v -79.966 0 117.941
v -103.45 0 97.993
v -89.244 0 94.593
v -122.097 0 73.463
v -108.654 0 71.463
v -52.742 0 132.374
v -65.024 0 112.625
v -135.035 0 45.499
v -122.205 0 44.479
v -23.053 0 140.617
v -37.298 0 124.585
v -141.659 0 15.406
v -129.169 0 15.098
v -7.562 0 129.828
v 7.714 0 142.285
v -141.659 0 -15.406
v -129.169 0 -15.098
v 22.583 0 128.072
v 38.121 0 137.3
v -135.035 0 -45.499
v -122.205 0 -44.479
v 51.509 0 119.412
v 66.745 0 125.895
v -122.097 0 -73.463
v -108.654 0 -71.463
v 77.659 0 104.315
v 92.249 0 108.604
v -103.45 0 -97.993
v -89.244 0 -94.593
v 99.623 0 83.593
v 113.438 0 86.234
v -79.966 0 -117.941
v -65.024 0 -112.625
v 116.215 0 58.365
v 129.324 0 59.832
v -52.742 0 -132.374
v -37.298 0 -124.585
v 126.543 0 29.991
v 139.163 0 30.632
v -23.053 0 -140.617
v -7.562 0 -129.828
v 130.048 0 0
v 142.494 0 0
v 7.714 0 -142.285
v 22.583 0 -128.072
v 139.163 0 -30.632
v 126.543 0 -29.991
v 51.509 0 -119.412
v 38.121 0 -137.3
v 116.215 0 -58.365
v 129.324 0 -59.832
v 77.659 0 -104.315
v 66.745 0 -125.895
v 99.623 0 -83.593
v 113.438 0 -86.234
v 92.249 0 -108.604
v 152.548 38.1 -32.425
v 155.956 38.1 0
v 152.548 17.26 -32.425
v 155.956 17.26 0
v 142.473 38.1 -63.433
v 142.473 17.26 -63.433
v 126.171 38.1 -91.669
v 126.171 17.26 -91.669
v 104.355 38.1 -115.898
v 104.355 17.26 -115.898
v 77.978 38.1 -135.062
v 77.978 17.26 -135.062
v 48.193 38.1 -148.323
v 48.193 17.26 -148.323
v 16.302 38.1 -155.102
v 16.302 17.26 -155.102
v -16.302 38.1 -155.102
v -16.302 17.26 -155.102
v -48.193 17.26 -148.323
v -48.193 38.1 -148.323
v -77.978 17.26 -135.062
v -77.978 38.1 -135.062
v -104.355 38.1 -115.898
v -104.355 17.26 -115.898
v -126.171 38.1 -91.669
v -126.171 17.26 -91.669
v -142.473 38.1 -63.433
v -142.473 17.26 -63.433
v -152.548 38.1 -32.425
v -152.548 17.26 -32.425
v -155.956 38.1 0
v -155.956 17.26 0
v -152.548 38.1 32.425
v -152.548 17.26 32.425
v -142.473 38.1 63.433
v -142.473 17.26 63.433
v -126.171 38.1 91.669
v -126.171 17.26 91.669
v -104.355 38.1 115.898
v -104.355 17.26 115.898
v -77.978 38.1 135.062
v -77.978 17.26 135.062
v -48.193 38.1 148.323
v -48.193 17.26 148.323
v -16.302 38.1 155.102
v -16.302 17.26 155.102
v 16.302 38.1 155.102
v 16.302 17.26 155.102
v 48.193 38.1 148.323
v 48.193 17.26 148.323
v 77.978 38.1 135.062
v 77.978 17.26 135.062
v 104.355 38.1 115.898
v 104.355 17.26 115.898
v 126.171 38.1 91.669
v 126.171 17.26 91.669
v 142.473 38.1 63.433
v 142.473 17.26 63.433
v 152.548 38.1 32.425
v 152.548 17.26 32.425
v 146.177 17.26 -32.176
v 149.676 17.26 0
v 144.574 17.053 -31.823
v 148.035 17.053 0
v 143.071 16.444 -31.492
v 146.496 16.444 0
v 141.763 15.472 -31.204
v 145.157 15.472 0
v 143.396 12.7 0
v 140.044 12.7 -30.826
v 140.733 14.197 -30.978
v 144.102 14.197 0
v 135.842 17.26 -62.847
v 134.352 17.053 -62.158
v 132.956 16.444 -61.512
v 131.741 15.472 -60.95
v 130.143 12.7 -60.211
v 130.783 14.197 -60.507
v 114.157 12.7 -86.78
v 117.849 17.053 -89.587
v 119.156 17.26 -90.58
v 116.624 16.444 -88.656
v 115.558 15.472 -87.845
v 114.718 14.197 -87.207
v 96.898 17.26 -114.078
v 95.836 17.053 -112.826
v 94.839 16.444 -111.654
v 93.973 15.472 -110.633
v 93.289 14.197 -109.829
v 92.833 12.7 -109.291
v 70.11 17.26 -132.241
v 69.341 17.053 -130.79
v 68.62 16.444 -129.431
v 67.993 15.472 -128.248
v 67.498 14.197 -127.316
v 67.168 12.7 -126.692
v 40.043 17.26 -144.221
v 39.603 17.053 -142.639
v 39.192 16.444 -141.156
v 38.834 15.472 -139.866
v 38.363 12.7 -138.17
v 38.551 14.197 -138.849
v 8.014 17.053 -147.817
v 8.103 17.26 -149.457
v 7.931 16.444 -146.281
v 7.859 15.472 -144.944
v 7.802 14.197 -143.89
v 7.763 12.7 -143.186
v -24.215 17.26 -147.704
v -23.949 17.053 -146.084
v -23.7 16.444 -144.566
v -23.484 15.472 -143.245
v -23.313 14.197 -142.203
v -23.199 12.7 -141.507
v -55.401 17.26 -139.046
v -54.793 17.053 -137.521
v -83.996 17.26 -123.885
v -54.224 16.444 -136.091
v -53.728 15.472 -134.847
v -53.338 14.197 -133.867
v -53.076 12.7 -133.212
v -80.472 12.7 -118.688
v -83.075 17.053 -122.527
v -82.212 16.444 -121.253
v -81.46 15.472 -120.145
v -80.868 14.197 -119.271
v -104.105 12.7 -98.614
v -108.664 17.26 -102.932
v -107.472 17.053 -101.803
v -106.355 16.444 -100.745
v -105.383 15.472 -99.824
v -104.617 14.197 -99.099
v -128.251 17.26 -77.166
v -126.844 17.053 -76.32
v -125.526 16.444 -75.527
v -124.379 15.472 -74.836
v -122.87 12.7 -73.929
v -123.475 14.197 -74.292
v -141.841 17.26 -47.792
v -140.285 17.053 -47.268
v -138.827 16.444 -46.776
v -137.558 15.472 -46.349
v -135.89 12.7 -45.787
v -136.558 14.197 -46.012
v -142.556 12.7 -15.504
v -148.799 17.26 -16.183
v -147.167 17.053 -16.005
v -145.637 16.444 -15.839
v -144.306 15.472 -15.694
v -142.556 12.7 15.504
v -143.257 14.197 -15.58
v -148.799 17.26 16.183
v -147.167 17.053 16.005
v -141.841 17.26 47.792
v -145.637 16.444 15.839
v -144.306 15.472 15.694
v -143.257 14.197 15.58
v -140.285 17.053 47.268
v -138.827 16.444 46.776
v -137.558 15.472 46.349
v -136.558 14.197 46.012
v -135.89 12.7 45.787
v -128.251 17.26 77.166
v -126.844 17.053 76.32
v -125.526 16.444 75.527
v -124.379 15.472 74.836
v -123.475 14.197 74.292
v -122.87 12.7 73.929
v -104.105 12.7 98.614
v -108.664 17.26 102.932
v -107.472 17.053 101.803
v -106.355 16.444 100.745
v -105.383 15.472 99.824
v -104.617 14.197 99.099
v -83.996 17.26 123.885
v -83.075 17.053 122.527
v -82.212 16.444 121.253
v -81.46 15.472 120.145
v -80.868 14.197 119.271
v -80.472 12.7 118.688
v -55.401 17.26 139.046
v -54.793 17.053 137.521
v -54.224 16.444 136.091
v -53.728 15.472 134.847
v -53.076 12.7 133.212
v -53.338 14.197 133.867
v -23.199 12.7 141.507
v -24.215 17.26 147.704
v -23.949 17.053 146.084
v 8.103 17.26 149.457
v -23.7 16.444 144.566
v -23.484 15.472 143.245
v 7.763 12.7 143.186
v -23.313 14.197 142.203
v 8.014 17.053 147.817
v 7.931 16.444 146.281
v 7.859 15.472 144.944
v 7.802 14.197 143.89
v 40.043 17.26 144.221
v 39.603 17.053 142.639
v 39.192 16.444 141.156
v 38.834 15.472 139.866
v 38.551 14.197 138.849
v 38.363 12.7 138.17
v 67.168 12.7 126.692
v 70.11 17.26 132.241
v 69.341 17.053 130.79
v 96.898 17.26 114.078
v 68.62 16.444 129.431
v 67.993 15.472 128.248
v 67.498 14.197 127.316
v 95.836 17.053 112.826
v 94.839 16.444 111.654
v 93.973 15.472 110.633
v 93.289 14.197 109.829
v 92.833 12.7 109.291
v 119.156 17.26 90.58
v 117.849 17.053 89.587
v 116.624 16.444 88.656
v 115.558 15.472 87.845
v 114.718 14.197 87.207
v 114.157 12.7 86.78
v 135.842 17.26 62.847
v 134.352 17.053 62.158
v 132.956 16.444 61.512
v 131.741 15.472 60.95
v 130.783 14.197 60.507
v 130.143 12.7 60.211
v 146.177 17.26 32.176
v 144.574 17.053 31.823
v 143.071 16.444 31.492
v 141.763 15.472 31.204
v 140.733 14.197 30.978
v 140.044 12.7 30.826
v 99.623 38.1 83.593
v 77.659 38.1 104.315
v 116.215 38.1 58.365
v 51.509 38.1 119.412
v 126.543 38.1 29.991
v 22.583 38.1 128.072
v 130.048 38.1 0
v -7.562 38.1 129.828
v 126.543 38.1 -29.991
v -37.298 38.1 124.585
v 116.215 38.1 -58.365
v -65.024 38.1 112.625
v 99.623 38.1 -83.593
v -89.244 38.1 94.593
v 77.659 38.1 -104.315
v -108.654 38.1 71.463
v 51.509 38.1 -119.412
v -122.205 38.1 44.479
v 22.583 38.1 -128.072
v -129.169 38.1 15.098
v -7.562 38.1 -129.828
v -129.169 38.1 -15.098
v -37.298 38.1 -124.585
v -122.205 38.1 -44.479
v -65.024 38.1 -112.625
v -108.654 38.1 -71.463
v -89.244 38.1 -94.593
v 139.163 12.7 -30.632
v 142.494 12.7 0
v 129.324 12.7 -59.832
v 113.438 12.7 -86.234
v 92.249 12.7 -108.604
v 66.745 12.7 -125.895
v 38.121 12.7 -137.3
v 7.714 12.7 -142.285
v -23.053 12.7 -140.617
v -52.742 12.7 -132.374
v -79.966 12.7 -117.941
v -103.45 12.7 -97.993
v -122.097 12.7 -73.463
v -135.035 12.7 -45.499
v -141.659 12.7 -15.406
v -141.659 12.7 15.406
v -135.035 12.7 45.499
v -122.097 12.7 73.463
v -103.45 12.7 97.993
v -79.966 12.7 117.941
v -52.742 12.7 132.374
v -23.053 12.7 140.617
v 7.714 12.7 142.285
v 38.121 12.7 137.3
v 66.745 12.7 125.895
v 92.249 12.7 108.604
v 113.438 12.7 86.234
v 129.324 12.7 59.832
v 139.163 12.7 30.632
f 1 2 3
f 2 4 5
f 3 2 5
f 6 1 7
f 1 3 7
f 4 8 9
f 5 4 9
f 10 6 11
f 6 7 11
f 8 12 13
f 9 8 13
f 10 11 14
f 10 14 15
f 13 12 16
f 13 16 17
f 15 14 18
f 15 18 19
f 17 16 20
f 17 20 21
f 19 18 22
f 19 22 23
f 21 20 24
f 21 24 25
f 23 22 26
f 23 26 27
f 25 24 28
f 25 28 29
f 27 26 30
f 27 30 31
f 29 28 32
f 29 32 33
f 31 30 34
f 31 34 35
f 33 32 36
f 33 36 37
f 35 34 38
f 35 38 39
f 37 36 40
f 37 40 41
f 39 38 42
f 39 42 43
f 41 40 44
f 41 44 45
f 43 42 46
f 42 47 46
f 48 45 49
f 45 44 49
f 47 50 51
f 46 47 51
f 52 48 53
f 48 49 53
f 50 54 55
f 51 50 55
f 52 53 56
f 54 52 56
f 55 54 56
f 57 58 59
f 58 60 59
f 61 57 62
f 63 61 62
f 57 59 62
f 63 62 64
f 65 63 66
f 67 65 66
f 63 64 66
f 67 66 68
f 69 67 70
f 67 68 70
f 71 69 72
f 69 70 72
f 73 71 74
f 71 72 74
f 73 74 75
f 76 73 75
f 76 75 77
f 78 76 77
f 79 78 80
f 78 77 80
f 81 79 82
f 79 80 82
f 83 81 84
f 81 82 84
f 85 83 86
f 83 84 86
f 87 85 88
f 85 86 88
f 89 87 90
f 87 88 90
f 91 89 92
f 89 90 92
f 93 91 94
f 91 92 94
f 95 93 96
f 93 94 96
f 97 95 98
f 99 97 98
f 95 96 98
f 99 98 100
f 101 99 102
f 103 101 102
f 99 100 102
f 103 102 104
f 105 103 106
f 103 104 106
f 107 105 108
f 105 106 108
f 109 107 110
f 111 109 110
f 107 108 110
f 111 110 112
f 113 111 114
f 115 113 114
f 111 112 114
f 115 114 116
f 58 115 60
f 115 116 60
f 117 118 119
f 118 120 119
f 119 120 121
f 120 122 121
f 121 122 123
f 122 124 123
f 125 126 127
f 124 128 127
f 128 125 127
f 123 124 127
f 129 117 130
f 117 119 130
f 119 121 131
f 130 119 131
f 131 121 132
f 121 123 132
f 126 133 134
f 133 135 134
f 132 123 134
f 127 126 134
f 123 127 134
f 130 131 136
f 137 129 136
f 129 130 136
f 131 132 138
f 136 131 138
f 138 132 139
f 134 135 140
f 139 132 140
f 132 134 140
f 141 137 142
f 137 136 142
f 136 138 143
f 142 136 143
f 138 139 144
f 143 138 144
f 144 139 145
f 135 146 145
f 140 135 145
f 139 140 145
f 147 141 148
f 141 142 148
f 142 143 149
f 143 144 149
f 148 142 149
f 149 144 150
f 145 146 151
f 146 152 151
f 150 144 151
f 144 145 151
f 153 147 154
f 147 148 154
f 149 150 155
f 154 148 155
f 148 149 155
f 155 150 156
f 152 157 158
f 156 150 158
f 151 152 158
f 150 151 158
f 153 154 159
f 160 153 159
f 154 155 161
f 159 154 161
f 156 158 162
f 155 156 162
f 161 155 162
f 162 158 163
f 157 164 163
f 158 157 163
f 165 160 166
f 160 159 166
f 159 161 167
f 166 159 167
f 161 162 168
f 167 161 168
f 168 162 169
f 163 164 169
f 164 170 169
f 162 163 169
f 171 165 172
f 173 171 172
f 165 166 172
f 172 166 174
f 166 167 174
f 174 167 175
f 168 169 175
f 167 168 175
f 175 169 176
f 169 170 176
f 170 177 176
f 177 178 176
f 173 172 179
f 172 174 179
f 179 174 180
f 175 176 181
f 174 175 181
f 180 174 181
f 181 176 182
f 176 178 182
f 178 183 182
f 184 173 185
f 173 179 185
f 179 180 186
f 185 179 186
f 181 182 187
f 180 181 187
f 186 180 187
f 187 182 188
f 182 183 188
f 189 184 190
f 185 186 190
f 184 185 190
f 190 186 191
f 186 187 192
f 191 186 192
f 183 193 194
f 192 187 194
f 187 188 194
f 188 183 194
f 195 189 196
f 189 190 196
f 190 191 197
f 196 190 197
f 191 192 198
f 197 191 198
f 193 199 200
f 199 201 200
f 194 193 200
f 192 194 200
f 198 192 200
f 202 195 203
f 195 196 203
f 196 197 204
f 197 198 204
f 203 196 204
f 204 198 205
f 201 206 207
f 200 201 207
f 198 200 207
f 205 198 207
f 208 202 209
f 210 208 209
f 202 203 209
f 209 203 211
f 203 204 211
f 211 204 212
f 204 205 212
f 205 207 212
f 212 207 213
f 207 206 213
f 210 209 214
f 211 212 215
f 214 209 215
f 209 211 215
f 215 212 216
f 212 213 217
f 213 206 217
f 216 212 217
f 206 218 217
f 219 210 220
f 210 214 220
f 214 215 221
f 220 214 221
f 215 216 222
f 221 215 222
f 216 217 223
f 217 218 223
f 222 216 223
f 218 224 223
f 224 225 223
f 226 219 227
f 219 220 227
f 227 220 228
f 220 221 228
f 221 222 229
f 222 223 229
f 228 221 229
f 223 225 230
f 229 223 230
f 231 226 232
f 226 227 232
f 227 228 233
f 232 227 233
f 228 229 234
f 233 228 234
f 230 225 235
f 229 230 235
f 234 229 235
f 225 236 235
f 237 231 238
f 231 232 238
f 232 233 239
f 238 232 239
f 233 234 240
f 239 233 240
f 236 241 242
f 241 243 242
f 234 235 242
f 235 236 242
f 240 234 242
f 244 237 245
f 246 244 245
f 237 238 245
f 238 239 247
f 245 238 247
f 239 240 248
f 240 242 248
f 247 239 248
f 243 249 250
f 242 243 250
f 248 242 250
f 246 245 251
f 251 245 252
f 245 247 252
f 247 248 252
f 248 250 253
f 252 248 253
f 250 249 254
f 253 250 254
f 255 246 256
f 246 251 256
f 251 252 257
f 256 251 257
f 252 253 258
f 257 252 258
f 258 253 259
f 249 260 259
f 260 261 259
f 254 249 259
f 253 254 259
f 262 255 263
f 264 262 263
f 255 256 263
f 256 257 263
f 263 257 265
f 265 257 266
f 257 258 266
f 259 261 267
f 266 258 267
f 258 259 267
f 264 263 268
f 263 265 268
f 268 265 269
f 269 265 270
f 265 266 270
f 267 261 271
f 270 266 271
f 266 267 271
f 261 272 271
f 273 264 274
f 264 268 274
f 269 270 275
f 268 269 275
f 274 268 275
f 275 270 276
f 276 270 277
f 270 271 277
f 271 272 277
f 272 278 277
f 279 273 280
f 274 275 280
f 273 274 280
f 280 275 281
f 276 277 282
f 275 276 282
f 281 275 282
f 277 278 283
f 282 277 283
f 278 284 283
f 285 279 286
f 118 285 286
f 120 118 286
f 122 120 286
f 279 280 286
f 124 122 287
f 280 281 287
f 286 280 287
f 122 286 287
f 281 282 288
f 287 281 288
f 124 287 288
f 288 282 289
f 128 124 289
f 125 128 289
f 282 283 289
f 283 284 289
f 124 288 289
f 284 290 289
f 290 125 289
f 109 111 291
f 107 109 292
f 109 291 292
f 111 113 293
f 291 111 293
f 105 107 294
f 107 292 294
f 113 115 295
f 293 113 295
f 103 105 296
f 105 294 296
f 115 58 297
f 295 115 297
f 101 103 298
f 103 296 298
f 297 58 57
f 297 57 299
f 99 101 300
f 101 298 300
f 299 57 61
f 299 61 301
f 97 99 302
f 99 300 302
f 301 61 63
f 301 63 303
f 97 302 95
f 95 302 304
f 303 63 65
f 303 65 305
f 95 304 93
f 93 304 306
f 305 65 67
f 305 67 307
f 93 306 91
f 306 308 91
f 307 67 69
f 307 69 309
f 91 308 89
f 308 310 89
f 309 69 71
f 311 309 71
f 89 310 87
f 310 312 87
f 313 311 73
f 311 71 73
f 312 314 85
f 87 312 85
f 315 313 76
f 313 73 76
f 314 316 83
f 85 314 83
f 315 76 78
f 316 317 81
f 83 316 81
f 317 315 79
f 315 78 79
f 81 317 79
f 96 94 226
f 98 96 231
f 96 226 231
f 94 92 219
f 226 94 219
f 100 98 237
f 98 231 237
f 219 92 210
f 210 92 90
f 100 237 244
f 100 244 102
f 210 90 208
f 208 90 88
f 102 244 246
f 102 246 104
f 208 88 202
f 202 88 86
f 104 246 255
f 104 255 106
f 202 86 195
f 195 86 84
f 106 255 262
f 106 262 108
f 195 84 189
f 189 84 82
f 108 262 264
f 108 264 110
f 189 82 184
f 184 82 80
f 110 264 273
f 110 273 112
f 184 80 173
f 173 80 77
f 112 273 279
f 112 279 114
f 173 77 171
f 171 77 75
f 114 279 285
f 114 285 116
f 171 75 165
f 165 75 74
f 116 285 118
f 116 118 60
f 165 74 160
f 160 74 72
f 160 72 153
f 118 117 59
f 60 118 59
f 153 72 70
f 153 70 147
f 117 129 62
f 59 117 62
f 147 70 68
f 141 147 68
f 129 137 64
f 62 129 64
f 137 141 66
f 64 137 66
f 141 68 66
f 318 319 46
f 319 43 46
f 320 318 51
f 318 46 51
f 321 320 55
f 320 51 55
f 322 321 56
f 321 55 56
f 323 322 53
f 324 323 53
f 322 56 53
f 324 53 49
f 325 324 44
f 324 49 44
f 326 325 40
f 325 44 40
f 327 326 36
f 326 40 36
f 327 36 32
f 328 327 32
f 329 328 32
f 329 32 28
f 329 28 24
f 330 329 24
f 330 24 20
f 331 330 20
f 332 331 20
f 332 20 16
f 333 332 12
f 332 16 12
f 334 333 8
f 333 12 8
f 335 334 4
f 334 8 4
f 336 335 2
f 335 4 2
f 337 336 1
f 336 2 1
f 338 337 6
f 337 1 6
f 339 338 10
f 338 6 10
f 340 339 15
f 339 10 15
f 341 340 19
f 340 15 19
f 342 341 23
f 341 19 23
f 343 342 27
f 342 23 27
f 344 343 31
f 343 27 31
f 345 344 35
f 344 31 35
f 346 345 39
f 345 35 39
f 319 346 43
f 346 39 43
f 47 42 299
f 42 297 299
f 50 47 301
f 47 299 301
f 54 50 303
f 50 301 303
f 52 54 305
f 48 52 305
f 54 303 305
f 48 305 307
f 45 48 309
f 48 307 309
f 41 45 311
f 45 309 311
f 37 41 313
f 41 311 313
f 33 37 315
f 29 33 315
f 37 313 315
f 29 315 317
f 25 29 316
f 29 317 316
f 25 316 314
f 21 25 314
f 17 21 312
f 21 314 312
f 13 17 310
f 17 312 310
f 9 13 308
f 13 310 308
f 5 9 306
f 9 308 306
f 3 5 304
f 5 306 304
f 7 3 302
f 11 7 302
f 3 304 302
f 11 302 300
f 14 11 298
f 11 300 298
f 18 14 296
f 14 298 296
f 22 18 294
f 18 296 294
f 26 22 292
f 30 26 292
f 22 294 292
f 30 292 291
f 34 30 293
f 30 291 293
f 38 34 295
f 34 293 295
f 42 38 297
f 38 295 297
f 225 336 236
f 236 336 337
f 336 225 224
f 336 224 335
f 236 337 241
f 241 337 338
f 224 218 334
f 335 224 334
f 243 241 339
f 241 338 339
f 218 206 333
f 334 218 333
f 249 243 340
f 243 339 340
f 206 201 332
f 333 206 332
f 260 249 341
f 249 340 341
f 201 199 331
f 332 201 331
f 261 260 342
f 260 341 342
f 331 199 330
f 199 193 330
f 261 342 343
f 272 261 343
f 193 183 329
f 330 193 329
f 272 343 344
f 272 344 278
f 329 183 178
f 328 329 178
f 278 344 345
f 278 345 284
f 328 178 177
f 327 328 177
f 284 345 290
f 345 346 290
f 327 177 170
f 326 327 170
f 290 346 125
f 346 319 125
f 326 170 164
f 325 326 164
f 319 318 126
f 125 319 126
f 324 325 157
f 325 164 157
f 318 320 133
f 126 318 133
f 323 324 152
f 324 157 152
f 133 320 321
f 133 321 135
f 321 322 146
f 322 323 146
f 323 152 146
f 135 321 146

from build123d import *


with BuildPart() as part:
    # Esquisse1 → Révolution1 (revolve)
    with BuildSketch(Plane.XY):
        with BuildLine():
            Line((143.396454905, 12.7), (142.494, 12.7))
            Line((142.494, 12.7), (142.494, 0))
            Line((142.494, 0), (130.048, 0))
            Line((130.048, 0), (130.048, 38.1))
            Line((130.048, 38.1), (155.956, 38.1))
            Line((155.956, 38.1), (155.956, 17.260162249))
            Line((155.956, 17.260162249), (149.676227452, 17.260162249))
            ThreePointArc((149.676227452, 17.260162249), (145.79580792, 15.999865109), (143.396454905, 12.7))
        make_face()
    revolve(axis=Axis((0, 0, 0), (0, 1, 0)))


solid = part.part
